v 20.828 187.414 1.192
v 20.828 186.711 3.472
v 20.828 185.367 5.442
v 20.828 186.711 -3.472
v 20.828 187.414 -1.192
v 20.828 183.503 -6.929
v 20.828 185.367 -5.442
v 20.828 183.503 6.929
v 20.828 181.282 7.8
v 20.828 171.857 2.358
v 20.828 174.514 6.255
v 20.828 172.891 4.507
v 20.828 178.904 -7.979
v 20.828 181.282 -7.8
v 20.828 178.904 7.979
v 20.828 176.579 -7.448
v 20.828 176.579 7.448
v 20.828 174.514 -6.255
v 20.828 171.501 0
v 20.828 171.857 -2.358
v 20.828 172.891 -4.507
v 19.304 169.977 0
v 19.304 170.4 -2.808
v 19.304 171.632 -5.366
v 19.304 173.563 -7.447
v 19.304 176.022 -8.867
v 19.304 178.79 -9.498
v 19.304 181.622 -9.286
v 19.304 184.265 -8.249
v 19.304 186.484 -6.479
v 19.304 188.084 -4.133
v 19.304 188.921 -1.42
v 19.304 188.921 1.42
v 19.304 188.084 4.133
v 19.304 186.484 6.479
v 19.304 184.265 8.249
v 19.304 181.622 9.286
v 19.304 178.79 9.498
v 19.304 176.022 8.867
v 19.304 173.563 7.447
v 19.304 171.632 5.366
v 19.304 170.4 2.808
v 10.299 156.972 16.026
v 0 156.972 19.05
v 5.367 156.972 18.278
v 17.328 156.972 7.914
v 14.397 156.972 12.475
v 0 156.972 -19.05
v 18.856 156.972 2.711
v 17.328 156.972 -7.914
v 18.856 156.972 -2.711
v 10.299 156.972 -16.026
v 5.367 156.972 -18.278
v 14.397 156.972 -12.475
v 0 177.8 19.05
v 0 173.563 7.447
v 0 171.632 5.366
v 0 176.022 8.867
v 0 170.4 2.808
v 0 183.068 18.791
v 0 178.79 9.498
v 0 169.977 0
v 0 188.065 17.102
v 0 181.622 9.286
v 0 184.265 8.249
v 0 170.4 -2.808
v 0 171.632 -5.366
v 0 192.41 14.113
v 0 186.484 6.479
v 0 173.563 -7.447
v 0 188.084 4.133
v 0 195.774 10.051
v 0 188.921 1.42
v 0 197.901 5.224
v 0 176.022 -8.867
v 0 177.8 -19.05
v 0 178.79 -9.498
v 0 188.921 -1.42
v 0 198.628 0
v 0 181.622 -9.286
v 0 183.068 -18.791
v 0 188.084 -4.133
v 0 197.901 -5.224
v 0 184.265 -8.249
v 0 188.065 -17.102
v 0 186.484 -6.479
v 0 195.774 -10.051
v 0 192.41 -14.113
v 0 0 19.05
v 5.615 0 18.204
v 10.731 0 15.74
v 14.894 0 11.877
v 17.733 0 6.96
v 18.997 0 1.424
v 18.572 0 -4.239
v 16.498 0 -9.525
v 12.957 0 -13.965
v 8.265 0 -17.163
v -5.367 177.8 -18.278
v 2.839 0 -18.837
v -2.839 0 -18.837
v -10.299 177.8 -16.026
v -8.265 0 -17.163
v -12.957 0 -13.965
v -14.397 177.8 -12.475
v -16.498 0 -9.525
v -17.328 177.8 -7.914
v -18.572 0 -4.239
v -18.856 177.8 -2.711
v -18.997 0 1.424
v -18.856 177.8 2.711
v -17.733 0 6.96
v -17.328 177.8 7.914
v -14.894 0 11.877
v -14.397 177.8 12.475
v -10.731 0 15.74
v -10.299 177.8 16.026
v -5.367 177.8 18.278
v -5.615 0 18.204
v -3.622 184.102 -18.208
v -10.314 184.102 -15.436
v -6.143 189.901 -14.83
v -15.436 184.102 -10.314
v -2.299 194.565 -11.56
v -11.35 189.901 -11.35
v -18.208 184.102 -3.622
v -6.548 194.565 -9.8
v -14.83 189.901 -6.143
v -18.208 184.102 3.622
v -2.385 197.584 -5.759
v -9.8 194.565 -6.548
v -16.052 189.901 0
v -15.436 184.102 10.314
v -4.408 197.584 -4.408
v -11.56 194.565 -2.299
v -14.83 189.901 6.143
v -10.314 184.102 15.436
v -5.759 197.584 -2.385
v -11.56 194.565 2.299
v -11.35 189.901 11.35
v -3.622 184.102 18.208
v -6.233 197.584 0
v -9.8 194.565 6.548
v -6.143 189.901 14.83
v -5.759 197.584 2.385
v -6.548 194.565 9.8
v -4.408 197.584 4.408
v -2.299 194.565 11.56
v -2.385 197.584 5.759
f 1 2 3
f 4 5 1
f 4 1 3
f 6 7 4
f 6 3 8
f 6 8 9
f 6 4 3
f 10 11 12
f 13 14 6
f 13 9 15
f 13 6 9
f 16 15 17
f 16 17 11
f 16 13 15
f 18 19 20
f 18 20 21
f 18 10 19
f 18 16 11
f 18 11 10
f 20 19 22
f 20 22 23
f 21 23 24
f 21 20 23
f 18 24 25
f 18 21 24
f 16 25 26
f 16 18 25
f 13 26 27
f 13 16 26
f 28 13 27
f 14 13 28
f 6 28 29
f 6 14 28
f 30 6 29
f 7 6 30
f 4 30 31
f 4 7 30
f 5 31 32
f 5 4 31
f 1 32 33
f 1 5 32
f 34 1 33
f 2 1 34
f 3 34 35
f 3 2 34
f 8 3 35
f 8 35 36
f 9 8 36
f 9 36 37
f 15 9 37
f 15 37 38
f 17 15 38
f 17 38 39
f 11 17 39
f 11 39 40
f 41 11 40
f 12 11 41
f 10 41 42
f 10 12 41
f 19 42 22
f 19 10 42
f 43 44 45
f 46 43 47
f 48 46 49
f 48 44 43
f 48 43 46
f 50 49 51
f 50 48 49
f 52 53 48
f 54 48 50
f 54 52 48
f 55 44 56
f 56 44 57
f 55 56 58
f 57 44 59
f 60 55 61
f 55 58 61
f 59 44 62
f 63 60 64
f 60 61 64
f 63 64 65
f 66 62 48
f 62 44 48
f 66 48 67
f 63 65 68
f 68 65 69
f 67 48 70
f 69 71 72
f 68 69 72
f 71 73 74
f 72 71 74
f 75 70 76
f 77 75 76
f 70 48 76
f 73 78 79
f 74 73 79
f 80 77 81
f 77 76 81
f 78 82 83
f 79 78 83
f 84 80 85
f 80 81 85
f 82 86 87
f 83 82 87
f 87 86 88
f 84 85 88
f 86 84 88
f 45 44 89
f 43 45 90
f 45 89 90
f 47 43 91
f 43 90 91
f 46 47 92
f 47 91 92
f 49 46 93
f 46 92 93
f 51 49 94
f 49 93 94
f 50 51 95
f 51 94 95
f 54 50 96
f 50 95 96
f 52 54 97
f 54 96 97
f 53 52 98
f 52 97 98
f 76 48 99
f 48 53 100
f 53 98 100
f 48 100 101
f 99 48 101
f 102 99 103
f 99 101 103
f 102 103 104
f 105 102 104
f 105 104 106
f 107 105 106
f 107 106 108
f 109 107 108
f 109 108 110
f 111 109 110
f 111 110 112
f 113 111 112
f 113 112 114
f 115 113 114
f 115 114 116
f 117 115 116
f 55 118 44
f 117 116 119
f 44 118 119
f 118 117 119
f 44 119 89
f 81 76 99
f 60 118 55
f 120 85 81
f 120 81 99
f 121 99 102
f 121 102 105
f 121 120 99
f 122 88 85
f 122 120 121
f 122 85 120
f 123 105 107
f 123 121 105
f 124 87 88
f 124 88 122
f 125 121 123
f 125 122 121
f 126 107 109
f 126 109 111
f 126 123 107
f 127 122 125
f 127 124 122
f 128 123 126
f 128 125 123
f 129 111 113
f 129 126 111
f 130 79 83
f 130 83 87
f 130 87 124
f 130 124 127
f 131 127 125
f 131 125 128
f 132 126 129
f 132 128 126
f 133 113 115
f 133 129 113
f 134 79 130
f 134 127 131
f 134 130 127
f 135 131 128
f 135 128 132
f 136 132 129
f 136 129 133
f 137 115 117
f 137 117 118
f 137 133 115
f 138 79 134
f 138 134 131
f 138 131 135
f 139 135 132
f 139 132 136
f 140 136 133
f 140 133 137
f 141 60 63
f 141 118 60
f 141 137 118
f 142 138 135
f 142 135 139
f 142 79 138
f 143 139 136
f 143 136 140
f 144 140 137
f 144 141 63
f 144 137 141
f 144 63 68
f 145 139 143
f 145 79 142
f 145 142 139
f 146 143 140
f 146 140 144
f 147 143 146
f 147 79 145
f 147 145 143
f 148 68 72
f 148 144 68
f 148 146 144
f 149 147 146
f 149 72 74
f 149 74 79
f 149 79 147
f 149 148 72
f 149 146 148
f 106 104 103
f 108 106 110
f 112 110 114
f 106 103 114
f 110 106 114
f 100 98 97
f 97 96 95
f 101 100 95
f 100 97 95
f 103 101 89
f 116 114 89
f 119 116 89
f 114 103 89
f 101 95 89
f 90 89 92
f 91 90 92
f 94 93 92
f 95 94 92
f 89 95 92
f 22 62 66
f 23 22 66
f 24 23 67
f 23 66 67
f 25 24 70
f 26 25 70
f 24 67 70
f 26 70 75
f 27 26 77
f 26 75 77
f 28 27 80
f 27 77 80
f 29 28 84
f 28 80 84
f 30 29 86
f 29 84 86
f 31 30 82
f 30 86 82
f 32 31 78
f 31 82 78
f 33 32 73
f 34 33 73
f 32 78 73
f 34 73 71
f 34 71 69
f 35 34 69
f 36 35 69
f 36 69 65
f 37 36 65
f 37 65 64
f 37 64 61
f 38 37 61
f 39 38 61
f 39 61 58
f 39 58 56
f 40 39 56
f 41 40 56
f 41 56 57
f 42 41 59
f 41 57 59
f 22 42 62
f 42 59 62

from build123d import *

# Parameters (mm, degrees)
SKETCH1_R               = 19.05
BOSS_EXTRUDE1_DEPTH     = 177.8
DOME1_FACE_RADIUS       = 19.05
DOME1_HEIGHT            = 20.828
CUT_EXTRUDE1_DEPTH      = 201.461172648
CUT_EXTRUDE1_DEPTH_BACK = 201.461172648
SKETCH2_W               = 31.75
SKETCH2_H               = 41.656
SKETCH3_R               = 9.525
BOSS_EXTRUDE2_DEPTH     = 20.828
CHAMFER1_SIZE           = 1.524


with BuildPart() as part:
    # Sketch1 → Boss-Extrude1 (new body)
    with BuildSketch(Plane(origin=(0, 0, 0), x_dir=(1, 0, 0), z_dir=(0, 1, 0))):
        with Locations(Location((0, 0, 0), (0, 0, 270))):
            Circle(SKETCH1_R)
    extrude(amount=BOSS_EXTRUDE1_DEPTH)

    # Dome1: a dome of height H over a round flat face of radius A is a cap of a sphere of radius (A * A + H * H) / (2 * H)
    dome1_r = (DOME1_FACE_RADIUS * DOME1_FACE_RADIUS + DOME1_HEIGHT * DOME1_HEIGHT) / (2 * DOME1_HEIGHT)
    dome1_base = Plane((0, 177.8, 0), z_dir=(0, 1, 0))
    with Locations(dome1_base.offset(DOME1_HEIGHT - dome1_r)):
        dome1_ball = Sphere(dome1_r, mode=Mode.PRIVATE)
    add(split(dome1_ball, bisect_by=dome1_base, keep=Keep.TOP, mode=Mode.PRIVATE))

    # Sketch2 → Cut-Extrude1 (cut, two sides: drawn at the far end of the back side and taken through both)
    with BuildSketch(Plane.XY.offset(-CUT_EXTRUDE1_DEPTH_BACK)):
        with Locations((15.875, 177.8)):
            Rectangle(SKETCH2_W, SKETCH2_H)
    extrude(amount=CUT_EXTRUDE1_DEPTH + CUT_EXTRUDE1_DEPTH_BACK, mode=Mode.SUBTRACT)

    # Sketch3 → Boss-Extrude2 (add)
    with BuildSketch(Plane(origin=(0, 0, 0), x_dir=(0, 0, -1), z_dir=(1, 0, 0))):
        with Locations(Location((0, 179.502109756, 0), (0, 0, 270))):
            Circle(SKETCH3_R)
    extrude(amount=BOSS_EXTRUDE2_DEPTH)

    # Chamfer1
    chamfer1_edges = [part.edges().sort_by_distance(p)[0] for p in [
        (20.828, 189.027109756, 0),
    ]]
    chamfer(chamfer1_edges, length=CHAMFER1_SIZE)


solid = part.part
